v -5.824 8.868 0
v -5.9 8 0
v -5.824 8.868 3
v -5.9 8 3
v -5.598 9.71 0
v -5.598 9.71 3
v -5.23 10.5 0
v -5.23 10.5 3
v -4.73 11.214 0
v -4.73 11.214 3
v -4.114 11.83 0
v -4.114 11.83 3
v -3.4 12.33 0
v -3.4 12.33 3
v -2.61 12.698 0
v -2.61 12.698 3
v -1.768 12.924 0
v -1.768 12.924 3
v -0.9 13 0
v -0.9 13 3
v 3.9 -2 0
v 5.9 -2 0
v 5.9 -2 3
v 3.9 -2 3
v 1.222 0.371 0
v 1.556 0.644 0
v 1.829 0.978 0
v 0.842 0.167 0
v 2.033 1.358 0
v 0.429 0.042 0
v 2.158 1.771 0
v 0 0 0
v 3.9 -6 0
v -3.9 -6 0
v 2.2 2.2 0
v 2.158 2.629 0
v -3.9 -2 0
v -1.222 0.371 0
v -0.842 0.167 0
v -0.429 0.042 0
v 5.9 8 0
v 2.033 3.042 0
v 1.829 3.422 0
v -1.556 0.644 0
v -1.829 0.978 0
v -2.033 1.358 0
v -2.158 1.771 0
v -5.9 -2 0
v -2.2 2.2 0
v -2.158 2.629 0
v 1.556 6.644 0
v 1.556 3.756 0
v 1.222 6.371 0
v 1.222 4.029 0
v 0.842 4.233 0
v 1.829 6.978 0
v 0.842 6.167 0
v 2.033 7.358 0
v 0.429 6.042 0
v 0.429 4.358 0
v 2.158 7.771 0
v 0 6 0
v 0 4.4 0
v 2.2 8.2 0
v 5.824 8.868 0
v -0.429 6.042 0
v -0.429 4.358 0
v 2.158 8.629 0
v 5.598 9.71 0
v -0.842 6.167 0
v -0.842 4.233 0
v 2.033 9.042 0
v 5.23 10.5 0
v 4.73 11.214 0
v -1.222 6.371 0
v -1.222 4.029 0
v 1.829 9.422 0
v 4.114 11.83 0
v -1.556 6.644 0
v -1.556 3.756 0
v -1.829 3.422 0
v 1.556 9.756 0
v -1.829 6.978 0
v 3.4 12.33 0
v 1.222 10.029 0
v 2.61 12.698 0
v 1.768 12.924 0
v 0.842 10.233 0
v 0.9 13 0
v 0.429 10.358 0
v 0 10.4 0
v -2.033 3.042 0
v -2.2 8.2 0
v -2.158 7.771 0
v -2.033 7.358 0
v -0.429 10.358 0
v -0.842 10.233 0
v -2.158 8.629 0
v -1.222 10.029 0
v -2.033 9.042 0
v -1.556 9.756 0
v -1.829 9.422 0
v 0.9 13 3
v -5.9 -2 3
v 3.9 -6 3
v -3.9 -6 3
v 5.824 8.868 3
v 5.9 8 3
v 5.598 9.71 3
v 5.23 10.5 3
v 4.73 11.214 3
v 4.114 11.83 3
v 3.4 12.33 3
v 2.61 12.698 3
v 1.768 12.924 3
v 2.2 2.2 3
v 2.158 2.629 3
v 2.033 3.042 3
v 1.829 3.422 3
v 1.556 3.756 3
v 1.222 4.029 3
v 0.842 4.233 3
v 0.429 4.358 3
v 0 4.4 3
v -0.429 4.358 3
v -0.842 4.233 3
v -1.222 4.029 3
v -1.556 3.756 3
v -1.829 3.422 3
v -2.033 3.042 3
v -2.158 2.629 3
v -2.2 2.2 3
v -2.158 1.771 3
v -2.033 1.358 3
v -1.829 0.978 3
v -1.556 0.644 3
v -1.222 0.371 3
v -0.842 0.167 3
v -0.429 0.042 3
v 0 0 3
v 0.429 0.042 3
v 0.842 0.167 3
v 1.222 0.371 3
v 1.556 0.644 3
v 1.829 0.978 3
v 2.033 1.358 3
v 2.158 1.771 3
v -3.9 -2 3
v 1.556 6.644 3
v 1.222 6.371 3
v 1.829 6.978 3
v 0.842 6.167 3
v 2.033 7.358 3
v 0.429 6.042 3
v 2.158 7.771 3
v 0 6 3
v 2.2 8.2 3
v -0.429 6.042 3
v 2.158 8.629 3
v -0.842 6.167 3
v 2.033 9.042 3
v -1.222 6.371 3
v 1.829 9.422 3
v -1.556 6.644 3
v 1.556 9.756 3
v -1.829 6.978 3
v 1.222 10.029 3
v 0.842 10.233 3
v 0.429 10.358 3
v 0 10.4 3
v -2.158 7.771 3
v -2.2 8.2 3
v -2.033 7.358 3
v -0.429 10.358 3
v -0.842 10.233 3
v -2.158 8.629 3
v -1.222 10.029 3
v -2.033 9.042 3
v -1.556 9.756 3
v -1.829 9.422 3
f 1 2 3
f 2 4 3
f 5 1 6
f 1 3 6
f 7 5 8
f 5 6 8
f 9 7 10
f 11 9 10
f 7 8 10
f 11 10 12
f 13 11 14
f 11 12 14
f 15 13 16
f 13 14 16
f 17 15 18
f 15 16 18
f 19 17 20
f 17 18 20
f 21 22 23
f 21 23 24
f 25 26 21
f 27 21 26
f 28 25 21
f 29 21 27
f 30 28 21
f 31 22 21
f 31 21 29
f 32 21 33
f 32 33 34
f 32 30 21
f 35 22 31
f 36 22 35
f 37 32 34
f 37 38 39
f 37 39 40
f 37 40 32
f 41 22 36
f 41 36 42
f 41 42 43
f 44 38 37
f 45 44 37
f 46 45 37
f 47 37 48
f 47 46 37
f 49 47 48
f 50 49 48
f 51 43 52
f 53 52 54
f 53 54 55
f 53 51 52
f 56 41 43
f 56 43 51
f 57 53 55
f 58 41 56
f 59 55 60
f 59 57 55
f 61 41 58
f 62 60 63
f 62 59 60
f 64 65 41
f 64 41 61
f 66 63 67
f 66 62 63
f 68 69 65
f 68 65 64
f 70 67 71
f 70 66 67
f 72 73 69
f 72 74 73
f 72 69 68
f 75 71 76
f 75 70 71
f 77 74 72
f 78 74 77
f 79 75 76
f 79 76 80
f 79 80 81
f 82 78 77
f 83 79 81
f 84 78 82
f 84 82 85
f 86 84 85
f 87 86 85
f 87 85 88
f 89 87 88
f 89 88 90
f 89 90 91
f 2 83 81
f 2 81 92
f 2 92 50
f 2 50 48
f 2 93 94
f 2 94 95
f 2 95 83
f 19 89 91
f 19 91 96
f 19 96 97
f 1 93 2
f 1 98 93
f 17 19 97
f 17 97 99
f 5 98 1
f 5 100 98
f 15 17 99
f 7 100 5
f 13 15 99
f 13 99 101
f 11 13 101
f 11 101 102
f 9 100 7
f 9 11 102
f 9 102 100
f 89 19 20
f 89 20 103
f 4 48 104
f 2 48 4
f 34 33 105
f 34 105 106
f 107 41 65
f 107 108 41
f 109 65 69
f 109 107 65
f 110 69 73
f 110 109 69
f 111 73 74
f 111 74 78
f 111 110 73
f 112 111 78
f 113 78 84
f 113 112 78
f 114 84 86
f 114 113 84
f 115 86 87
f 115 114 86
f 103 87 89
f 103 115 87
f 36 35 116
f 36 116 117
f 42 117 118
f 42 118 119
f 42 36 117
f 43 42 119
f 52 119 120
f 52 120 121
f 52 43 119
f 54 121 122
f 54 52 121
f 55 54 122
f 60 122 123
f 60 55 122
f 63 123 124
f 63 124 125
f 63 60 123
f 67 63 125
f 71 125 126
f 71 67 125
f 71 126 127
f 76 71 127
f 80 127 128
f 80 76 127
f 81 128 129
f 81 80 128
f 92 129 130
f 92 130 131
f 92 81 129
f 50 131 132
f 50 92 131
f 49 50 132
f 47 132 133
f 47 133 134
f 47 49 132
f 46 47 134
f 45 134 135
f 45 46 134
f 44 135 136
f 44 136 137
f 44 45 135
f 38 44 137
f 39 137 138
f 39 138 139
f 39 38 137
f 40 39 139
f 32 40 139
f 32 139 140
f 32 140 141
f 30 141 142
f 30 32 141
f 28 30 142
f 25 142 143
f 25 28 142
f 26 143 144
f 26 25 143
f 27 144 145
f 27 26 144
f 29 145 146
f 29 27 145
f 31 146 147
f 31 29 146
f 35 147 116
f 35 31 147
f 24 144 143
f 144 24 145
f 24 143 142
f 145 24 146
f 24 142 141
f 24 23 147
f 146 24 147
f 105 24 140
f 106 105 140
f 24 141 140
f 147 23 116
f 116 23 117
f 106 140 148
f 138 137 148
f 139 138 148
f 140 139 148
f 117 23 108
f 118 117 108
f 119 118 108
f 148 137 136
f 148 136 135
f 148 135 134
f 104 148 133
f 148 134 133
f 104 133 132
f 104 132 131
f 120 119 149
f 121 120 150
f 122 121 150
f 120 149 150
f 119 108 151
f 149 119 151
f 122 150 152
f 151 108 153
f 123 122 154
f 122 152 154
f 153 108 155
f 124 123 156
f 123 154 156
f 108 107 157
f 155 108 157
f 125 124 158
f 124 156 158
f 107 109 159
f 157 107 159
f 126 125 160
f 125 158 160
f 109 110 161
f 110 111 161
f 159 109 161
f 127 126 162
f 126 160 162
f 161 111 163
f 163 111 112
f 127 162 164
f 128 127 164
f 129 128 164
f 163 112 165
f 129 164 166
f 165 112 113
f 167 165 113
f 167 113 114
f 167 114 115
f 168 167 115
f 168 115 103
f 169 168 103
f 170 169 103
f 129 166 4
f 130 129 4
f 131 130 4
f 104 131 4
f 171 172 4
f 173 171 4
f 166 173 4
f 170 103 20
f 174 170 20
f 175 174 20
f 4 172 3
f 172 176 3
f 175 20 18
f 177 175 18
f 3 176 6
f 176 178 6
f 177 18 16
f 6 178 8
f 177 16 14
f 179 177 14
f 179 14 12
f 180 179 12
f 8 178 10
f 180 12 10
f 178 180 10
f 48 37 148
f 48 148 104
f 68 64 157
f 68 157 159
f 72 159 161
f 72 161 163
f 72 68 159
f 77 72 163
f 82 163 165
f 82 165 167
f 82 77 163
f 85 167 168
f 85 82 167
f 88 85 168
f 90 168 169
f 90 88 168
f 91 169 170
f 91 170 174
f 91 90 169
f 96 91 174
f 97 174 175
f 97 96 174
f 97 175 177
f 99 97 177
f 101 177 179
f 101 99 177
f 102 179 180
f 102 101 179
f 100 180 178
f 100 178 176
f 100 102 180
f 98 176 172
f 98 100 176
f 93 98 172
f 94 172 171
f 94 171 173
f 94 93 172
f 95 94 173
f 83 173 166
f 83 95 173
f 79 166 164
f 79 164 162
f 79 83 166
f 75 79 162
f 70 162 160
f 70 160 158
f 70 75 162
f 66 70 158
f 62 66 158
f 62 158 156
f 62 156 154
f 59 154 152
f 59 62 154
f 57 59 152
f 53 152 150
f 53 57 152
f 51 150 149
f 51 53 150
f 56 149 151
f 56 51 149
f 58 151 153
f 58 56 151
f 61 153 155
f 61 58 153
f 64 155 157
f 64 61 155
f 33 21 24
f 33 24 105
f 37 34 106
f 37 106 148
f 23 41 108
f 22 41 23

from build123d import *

# Parameters (mm, degrees)
SKETCH001_R = 2.2
PAD_DEPTH   = 3
FILLET_R    = 5


with BuildPart() as part:
    # Sketch001 → Pad (new body)
    with BuildSketch(Plane.XY):
        Polygon((3.9, -6), (-3.9, -6), (-3.9, -2), (-5.9, -2), (-5.9, 13), (5.9, 13), (5.9, -2), (3.9, -2), align=None)
        with Locations((0, 8.2)):
            Circle(SKETCH001_R, mode=Mode.SUBTRACT)
        with Locations((0, 2.2)):
            Circle(SKETCH001_R, mode=Mode.SUBTRACT)
    extrude(amount=PAD_DEPTH)

    # Fillet
    fillet_edges = [part.edges().sort_by_distance(p)[0] for p in [
        (5.9, 13, 1.5),
        (-5.9, 13, 1.5),
    ]]
    fillet(fillet_edges, radius=FILLET_R)


solid = part.part
